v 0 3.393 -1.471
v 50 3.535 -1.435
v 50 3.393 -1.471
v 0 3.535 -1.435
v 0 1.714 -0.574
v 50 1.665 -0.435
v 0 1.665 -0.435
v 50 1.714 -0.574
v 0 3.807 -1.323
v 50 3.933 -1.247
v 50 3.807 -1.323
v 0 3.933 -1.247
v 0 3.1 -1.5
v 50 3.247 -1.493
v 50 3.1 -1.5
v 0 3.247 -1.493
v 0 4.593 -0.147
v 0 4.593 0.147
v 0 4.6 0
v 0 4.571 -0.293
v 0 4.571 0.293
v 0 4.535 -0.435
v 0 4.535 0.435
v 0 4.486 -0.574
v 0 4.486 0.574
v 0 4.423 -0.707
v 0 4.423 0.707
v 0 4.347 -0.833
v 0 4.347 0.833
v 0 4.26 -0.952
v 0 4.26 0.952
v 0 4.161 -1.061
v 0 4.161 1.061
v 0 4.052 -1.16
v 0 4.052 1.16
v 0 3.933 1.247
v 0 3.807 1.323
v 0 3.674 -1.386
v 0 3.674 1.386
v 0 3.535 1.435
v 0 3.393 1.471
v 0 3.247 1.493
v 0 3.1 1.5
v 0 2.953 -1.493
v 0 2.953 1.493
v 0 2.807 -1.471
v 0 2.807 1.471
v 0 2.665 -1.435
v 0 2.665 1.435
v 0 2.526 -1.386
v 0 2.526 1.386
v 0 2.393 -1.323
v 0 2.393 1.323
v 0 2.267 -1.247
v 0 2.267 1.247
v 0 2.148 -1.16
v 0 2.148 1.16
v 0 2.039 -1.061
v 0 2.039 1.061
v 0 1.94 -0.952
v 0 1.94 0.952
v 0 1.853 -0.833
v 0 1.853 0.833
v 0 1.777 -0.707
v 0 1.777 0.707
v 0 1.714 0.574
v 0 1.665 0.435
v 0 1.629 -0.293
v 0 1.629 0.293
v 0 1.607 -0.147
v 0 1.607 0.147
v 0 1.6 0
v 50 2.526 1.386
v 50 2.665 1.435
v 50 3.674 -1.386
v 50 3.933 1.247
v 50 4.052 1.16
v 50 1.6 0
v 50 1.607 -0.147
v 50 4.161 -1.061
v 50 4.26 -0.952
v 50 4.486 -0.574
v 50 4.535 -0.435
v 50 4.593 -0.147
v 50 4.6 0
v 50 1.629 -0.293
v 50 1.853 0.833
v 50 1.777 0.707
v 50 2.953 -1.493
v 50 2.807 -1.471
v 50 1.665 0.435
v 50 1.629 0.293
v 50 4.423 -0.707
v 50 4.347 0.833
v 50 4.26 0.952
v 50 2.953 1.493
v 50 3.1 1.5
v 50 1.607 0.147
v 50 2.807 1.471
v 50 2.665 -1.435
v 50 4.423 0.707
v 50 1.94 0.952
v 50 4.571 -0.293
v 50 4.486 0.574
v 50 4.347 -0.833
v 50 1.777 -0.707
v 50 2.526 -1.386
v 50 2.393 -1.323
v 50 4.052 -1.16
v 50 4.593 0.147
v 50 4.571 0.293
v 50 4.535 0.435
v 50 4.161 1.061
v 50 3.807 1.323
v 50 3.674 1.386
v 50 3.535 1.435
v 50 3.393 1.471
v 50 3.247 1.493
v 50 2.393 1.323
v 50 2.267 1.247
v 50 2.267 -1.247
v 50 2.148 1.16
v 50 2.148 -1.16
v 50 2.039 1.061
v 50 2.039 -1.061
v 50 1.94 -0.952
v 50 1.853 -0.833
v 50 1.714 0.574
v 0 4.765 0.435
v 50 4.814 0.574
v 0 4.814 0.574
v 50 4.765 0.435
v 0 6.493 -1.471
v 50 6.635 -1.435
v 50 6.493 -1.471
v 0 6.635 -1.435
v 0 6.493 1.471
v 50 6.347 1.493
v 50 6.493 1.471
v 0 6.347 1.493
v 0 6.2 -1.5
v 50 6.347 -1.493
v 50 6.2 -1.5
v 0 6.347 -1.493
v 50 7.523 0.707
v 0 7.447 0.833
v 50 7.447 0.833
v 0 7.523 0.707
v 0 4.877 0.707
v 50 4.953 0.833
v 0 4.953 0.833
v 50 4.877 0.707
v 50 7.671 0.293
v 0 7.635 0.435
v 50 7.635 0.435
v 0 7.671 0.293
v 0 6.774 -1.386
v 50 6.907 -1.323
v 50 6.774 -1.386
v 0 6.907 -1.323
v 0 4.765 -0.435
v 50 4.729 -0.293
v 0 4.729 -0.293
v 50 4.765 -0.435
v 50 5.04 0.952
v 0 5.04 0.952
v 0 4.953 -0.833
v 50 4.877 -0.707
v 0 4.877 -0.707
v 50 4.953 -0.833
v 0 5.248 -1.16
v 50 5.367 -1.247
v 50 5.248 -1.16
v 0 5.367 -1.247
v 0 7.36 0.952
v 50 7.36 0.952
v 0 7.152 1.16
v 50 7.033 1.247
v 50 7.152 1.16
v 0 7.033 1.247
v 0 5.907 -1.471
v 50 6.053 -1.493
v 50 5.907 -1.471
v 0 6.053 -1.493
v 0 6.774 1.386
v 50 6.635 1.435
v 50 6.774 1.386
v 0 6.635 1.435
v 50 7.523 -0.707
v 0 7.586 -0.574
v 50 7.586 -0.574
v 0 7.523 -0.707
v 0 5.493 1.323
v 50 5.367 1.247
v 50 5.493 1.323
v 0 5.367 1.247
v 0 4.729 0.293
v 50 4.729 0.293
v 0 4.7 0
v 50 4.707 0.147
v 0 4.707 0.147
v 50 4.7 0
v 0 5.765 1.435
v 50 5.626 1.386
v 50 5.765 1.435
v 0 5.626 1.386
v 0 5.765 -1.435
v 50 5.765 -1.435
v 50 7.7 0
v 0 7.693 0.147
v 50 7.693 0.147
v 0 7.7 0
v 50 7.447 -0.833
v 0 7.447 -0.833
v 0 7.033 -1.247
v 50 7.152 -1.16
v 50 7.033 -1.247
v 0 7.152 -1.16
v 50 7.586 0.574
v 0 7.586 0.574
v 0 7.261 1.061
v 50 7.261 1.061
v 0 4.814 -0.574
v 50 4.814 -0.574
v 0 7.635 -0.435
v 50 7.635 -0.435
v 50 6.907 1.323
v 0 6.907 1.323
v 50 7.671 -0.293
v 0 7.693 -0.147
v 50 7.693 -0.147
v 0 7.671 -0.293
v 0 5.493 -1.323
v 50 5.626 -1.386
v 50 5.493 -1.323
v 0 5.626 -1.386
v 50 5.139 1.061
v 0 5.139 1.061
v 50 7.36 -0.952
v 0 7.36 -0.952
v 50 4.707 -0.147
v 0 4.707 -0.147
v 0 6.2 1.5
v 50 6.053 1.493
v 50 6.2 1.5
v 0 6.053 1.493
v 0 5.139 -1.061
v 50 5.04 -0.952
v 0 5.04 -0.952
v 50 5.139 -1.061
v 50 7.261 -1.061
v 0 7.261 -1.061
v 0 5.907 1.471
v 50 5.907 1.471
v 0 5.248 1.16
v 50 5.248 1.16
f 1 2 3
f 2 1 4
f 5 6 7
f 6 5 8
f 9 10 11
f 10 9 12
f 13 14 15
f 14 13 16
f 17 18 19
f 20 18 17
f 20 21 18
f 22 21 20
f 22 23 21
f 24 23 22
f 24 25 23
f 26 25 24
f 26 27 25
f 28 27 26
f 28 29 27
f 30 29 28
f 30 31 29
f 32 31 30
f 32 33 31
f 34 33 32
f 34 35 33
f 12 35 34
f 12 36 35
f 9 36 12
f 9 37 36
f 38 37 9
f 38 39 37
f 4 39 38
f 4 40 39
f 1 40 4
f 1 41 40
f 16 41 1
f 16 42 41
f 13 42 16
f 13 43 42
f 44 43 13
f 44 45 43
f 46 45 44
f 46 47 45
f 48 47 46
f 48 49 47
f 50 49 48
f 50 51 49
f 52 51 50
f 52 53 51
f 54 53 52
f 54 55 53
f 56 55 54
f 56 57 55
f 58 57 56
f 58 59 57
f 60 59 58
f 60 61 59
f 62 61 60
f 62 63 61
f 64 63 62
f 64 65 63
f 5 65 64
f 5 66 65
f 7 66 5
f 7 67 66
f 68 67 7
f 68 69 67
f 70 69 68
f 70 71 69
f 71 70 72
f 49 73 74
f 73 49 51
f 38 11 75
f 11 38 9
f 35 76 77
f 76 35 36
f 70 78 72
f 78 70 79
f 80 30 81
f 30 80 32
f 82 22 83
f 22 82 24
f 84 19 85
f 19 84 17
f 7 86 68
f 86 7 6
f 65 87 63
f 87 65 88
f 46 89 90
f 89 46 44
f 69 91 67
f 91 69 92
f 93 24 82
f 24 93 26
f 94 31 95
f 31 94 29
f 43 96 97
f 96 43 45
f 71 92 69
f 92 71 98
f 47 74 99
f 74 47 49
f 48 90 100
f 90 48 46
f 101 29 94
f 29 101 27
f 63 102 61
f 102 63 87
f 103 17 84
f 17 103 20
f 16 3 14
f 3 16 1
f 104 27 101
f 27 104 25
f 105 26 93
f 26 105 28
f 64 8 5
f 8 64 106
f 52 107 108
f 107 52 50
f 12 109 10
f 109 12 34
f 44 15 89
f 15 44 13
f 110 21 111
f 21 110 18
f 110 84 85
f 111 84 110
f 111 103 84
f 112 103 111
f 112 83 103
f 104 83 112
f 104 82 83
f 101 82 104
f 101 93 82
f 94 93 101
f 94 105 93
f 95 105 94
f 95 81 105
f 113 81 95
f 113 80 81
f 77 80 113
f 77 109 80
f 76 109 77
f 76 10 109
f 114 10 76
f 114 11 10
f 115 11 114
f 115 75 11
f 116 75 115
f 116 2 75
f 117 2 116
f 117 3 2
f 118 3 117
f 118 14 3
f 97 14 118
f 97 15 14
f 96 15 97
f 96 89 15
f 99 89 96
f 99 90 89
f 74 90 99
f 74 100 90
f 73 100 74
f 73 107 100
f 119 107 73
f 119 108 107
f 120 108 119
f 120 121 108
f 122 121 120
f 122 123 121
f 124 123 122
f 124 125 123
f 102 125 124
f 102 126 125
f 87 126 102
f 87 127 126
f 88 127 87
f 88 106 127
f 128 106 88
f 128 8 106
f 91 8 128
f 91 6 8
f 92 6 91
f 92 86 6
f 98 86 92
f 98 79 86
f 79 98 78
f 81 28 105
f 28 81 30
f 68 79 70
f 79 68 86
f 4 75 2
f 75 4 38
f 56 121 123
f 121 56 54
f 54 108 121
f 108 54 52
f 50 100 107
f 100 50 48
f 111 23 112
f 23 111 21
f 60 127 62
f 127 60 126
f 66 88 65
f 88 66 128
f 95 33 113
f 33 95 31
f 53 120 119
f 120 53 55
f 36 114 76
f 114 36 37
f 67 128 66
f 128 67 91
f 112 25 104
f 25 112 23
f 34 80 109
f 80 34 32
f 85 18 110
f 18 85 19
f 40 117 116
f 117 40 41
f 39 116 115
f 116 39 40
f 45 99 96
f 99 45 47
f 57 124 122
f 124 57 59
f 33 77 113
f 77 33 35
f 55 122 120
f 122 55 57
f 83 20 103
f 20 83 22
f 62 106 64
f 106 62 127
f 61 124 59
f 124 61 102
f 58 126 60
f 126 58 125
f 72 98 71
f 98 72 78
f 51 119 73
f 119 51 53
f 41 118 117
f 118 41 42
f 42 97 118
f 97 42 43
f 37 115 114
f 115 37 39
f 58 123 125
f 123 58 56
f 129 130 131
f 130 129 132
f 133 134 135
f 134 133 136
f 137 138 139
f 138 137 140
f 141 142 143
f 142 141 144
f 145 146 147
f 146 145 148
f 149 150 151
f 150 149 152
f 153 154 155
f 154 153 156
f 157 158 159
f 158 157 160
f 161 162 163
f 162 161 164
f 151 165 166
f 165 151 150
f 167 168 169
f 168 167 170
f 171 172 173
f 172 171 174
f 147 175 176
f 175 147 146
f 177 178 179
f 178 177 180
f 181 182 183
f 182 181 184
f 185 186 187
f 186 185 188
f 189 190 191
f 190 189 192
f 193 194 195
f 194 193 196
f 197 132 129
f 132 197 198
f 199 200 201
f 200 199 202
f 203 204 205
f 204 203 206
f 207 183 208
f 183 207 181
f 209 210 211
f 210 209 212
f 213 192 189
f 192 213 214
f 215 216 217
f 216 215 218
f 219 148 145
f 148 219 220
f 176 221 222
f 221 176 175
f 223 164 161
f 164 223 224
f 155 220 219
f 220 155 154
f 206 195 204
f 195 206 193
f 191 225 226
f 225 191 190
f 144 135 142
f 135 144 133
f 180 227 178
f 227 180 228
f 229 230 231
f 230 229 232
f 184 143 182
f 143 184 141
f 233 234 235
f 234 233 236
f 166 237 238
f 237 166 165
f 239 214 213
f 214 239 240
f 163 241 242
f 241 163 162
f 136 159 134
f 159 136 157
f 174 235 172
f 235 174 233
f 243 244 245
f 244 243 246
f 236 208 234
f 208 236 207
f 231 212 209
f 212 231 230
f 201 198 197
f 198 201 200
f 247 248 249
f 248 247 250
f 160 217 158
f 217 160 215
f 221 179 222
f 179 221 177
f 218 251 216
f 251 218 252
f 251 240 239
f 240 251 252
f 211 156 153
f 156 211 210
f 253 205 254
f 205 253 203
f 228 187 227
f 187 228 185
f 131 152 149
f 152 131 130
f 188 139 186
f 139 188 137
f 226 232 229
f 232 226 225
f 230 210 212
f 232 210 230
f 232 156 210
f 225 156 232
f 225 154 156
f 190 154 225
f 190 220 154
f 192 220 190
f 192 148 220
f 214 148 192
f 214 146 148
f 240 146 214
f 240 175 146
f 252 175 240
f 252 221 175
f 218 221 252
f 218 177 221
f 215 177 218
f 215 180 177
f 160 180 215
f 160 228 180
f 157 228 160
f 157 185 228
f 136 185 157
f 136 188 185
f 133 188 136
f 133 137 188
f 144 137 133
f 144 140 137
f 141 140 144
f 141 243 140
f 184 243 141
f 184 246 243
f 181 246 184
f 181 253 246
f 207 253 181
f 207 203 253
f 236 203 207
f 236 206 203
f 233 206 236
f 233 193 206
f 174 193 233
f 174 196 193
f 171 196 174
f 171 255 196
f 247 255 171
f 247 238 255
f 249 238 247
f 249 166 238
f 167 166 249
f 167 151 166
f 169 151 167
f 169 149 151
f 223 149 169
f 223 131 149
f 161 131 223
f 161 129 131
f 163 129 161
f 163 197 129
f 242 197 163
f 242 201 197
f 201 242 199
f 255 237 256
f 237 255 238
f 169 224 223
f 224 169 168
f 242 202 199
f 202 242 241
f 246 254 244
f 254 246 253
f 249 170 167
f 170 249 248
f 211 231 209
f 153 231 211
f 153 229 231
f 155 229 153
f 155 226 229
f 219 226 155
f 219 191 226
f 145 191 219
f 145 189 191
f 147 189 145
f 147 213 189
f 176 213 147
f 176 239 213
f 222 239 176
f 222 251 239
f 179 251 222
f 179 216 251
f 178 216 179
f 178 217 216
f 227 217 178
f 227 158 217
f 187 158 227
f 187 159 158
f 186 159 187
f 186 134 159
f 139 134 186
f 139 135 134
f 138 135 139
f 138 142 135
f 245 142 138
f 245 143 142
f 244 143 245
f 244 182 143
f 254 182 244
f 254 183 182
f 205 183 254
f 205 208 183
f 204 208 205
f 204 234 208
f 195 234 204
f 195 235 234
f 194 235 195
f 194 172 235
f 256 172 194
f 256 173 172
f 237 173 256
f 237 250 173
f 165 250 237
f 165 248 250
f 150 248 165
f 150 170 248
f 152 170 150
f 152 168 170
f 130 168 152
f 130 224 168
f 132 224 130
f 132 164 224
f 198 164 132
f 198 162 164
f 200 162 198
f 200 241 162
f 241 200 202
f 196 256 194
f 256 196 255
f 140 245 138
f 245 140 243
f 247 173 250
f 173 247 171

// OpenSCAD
$fn=64;

number_of_sticks = 2;
stick_length = 50;

// Note that it prints slower with grooves
snap_grooves = false;

for(i=[1:number_of_sticks]) {

translate([0,i*3.1,0])
difference() {
    rotate([0,90,0]) cylinder(h=stick_length, d=3);

    // Uncomment if you want break off grooves every inch
    
    if (snap_grooves == true) {
    translate([25,0,0])
    rotate([0,90,0])
        rotate_extrude(convexity = 10)
            translate([2, 0, 0])
            circle(r = 1); 
    
    translate([50,0,0])
    rotate([0,90,0])
        rotate_extrude(convexity = 10)
            translate([2, 0, 0])
                circle(r = 1); 
    }
}

}
